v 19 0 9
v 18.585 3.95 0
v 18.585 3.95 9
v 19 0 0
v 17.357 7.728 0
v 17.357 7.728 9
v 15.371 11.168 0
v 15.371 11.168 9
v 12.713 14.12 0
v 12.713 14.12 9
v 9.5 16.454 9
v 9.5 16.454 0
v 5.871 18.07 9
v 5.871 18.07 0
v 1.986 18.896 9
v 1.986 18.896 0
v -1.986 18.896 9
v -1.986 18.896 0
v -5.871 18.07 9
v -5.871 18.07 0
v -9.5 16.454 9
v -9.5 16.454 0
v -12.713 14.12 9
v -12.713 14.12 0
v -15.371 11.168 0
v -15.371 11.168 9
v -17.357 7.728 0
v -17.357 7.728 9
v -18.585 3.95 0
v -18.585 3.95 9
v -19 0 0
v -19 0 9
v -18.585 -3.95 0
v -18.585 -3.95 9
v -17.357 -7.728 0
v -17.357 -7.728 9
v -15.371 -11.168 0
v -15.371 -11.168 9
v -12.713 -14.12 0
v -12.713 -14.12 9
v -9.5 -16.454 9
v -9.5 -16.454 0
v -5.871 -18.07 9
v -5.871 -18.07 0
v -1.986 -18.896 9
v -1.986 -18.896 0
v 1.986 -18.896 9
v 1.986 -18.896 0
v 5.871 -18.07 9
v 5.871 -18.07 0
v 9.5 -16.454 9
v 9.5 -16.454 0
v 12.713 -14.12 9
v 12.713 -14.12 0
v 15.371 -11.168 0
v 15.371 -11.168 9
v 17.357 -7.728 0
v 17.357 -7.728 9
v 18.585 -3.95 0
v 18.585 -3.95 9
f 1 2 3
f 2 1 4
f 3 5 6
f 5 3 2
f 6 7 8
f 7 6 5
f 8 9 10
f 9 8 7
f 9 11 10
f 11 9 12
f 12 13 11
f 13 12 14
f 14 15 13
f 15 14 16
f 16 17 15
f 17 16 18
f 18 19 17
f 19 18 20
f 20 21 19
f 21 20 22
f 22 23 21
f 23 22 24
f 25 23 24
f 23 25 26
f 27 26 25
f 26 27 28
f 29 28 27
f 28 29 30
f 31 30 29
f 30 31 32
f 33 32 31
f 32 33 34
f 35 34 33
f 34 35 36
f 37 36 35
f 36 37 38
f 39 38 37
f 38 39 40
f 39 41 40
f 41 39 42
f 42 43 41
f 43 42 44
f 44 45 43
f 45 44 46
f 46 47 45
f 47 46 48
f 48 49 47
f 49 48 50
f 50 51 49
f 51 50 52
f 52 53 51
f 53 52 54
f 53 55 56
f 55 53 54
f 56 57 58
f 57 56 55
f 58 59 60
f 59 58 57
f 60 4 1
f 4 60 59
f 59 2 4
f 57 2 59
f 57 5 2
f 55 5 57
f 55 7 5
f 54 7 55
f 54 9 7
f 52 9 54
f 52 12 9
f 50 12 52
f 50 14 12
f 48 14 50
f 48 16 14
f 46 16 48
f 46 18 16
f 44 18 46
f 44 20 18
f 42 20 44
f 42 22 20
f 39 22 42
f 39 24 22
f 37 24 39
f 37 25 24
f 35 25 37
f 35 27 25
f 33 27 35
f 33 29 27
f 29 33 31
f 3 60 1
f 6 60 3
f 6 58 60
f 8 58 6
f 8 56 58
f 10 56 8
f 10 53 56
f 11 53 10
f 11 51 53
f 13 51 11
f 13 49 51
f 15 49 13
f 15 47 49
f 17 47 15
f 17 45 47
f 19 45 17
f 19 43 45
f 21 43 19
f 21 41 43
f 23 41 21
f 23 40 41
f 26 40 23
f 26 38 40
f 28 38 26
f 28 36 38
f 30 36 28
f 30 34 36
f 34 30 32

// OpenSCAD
// Generated by SolidPython 1.0.1 on 2020-07-29 00:46:44


cylinder(h = 9, r1 = 19, r2 = 19);
/***********************************************
*********      SolidPython code:      **********
************************************************
 
# import packages: SolidPython
from solid import *
from solid.utils import *
from itertools import chain, combinations, permutations


class Resize:

    def __init__(self, scad_file):
        self.scad_file = scad_file
        #self.scad_file = import_scad(scad_file)
        # cone/cylinder param:
        self.r1 = 0
        self.r2 = 0
        self.h = 0
        # rectangular prism param:
        self.w = 0
        self.l = 0
        # ellipse param:
        self.r = 0

    # import OpenScad code (file name corresponds to shape)


    # classify shape + parameters
    def assign(self, param1, param2, param3):
        if self.scad_file == 'cone.scad':
            self.r1 = param1
            self.r2 = param2
            self.h = param3
        elif self.scad_file == 'cylinder.scad':
            self.r1 = param1
            self.r2 = param2
            self.h = param3
        elif self.scad_file == 'rectangularPrism.scad':
            self.h = param1
            self.l = param2
            self.w = param3
        else:
            self.r = param1
            self.h = param2

    # resize parameters
    def iterate(self):
        x = range(3, 20, 2)
        i = 1
        if self.scad_file == 'cone.scad':
            tempList = list(permutations(x, 2))
            for temp in tempList:
                param1 = temp[0]
                param2 = temp[1]
                filepath = 'produced_scad_files/' + 'cone' + str(param1) + '_' + str(param2) + '_' + '.scad'
                scad_render_to_file(cylinder(h=param1, r1=param2, r2=0), filepath)

        elif self.scad_file == 'cylinder.scad':
            tempList = list(permutations(x, 3))
            for temp in tempList:
                param1 = temp[0]
                param2 = temp[1]
                filepath = 'produced_scad_files/' + 'cylinder' + str(param1) + '_' + str(param2) + '_' + '.scad'
                scad_render_to_file(cylinder(h=param1, r1=param2, r2=param2), filepath)

        elif self.scad_file == 'rectangularPrism.scad':
            tempList = list(permutations(x, 3))
            for temp in tempList:
                param1 = temp[0]
                param2 = temp[1]
                param3 = temp[2]
                filepath = 'produced_scad_files/' + 'rectangularPrism' + str(param1) + '_' + str(param2) + '_' + str(
                    param3) + '.scad'
                scad_render_to_file(cube(size=(param1, param2, param3)), filepath)

        elif self.scad_file == 'ellipse.scad':
            tempList = list(permutations(x, 4))
            for temp in tempList:
                param1 = temp[0]
                param2 = temp[1]
                param3 = temp[2]
                param4 = temp[3]
                filepath = 'produced_scad_files/' + 'ellipse' + str(param1) + '_' + str(param2) + '_' + str(param3) + '_' + str(param4) + '.scad'
                scad_render_to_file(scale([param1, param2, param3])(sphere(r=param4)), filepath)

    def render_to_scadfile(self):
        scad_render_to_file(scad, 'example.scad') 
 
************************************************/
